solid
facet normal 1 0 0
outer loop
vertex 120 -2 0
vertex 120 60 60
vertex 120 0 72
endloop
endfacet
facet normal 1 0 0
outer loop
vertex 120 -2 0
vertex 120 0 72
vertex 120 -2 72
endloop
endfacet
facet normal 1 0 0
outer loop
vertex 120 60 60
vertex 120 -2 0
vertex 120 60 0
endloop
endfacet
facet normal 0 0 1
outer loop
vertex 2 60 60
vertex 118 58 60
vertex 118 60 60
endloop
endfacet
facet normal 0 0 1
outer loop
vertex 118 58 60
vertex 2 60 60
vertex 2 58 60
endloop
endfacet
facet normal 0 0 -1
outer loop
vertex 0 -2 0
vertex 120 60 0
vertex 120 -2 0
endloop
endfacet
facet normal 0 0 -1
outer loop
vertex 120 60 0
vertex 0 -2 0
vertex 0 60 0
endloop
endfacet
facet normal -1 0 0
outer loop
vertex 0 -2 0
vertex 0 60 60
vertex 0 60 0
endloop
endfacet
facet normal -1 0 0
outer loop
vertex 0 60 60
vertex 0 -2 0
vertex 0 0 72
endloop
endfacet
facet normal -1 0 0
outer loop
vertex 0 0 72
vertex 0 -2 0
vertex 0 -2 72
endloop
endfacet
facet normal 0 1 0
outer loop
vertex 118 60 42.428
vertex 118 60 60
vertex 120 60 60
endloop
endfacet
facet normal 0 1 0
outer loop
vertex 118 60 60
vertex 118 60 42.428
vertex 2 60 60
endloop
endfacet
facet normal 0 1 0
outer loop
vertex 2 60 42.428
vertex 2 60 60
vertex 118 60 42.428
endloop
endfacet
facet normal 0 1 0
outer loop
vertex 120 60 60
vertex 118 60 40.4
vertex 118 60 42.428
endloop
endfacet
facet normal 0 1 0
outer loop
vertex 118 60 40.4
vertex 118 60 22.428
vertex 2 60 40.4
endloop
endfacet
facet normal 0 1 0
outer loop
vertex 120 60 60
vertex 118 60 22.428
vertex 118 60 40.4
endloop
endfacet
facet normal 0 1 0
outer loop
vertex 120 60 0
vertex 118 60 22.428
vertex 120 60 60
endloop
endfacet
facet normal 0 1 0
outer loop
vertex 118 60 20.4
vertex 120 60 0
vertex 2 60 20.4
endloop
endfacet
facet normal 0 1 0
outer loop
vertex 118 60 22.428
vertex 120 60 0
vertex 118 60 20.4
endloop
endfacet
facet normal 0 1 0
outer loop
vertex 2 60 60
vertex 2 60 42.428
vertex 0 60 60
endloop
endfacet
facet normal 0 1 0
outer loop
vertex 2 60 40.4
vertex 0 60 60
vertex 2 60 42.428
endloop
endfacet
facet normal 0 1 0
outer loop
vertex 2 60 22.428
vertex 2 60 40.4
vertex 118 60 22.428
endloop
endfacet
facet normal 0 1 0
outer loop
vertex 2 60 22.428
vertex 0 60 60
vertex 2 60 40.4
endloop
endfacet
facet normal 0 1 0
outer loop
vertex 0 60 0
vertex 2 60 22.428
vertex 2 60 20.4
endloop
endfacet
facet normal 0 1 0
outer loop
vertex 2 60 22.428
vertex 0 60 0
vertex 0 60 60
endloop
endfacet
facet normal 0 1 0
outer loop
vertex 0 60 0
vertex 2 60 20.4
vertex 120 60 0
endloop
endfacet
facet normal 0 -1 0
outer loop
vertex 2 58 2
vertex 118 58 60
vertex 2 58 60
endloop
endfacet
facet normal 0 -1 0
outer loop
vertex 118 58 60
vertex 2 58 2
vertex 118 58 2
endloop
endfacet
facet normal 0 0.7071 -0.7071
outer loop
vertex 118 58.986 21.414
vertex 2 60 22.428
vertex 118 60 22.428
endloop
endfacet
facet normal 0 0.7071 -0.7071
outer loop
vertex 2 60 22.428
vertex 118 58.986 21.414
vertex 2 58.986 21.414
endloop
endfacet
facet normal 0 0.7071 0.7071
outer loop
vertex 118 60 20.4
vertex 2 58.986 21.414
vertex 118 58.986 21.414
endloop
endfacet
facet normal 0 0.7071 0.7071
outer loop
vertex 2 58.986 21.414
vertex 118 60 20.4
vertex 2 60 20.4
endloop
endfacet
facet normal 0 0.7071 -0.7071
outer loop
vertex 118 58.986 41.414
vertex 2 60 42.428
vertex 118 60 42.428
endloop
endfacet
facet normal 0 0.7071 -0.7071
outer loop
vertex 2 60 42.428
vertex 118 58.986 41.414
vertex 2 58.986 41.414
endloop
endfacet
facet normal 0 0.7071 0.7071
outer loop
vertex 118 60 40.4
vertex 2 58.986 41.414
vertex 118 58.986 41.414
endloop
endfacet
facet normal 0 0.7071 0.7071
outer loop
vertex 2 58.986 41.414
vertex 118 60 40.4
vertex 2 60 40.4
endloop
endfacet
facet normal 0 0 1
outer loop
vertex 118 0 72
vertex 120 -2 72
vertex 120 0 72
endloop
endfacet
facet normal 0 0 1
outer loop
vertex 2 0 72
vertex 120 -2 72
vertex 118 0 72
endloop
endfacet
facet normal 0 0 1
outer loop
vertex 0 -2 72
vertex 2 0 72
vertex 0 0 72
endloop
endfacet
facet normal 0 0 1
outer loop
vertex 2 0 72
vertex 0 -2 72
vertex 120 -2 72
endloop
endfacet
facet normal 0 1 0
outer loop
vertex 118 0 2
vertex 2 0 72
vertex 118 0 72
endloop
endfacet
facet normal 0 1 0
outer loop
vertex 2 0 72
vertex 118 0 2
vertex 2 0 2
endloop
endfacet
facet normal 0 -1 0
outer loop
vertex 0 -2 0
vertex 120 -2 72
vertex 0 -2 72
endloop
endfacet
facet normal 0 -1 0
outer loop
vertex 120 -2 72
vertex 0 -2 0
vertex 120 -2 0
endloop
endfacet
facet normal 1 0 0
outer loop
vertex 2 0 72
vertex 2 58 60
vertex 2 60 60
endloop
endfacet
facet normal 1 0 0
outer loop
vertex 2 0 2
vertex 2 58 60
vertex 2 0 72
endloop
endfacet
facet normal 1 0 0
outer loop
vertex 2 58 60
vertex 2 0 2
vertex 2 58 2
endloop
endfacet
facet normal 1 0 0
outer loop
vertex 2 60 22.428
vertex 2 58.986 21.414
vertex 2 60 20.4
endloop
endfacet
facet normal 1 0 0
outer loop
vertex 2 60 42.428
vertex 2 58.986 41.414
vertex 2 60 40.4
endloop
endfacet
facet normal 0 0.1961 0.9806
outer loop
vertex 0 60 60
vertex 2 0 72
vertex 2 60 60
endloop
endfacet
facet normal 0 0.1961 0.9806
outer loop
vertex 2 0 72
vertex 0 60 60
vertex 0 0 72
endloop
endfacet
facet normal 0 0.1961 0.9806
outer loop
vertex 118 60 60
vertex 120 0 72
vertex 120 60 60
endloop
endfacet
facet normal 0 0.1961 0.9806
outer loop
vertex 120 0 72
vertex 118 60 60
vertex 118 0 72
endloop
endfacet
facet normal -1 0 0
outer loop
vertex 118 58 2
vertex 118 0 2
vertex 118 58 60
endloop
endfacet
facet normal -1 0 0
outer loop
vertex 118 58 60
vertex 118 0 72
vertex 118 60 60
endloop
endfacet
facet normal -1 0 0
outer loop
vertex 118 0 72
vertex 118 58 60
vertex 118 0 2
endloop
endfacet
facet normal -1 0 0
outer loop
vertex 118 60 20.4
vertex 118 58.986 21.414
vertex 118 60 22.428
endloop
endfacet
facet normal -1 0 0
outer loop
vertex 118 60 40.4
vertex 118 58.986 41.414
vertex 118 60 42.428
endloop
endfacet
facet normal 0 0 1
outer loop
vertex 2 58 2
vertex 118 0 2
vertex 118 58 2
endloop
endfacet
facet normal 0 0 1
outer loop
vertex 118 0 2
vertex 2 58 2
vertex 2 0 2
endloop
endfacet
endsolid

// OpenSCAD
// file: ../util.scad
// numbers and logic
function int(s, total=0, i=0) = (i == len(s))
  ? total
  : int(s, total*10 + ord(s[i]) - ord("0"), i+1);

function frac(s) = int(s) / pow(10, len(s));

function num(s) =
  let (parts = split(s, "."))
  len(parts) == 1
  ? int(parts[0])
  : int(parts[0]) + frac(parts[1]);

function contains(list, item, i=0) = (i == len(list))
  ? false
  : list[i] == item || contains(list, item, i+1);

function any(list, i=0) = (i == len(list))
  ? false
  : list[i] || any(list, i+1);

function all(list, i=0) = (i == len(list))
  ? true
  : list[i] && all(list, i+1);

function _test_logic() =
  assert (int("123") == 123)
  assert (int("9999") == 9999)
  assert (frac("5") == 0.5)
  assert (frac("33333") == 0.33333)
  assert (frac("111111") == 0.111111)
  assert (frac("02") == 0.02)
  assert (frac("020000") == 0.02)
  assert (frac("0") == 0)
  assert (frac("0000000000000") == 0)
  assert (frac("0000000000001") == 0.0000000000001)
  assert (num("123") == 123)
  assert (num("2.75") == 2.75)
  assert (num("1234.991230149") == 1234.991230149) // I'm kinda shocked that works
  assert (contains("abcd", "d") == true)
  assert (contains("abcd", "Q") == false)
  assert (contains([1, 2, 3, 4], 1) == true)
  assert (contains([1, 2, 3, 4], 5) == false)
  assert (contains([["a"], 2, [], ""], []) == true)
  assert (contains([["a"], 2, [], ""], ["a"]) == true)
  assert (contains([["a"], 2, [], ""], ["b"]) == false)
  assert (all([1, true, "a"]) == true)
  assert (all([1, true, "a", ""]) == false)
  assert (all([]) == true)
  assert (any([false, "", 0, []]) == false)
  assert (any([false, "", 0, [], 1]) == true)
  assert (any([]) == false)
  "test logic success";

echo(_test_logic());


// strings
function is_int_string(s) = all([for(c=s) "0" <= c && c <= "9"]);

function is_num_string(s) =
  let (parts = split(s, "."))
  len(parts) == 1
  ? is_int_string(parts[0])
  : len(parts) == 2
    ? is_int_string(parts[0]) && is_int_string(parts[1])
    : false;

function strcat(char_array, i=0, r="") = (i == len(char_array))
  ? r
  : strcat(char_array, i+1, str(r, char_array[i]));

function substr(s, start=0, limit=undef) =
  // return str[i] where start <= i < limit
  let (end = limit == undef ? len(s)-1 : min(limit-1, len(s)-1))
  end < start
  ? ""
  : strcat([for (i=[start:end]) s[i]]);

function replace_substr(s, repl, start=0, limit=undef) =
  // remove a substring and replace it with another string
  let (end = limit == undef ? len(s)-1 : limit-1)
  str(substr(s, limit=start), repl, substr(s, start=end+1));

function split(s, separator=" ", parts=[]) =
  let (match=search(separator, s, 0)[0])
  match == []
  ? concat(parts, [s])
  : split(substr(s, start=match[0]+1), separator, concat(parts, [substr(s, limit=match[0])]));

function first(string, char, after=-1) =
  let (result = search(char, substr(string, start=after+1), 1))
  result == []
  ? undef
  : result[0] + after+1;

function last(string, char) =
  let (result=search(char, string, 0))
  result == []
  ? undef
  : result[0][len(result[0])-1];

function _test_strings() =
  assert (strcat([]) == "")
  assert (strcat(["a"]) == "a")
  assert (strcat(["a", "b"]) == "ab")
  assert (strcat(["a", "", "b"]) == "ab")
  assert (substr("abcde") == "abcde")
  assert (substr("abcde", start=0) == "abcde")
  assert (substr("abcde", start=1) == "bcde")
  assert (substr("abcde", limit=3) == "abc")
  assert (substr("abcde", start=2, limit=4) == "cd")
  assert (substr("abcde", start=99) == "")
  assert (replace_substr("abcde", "CD", start=2, limit=4) == "abCDe")
  assert (replace_substr("abcde", "CD", start=2, limit=5) == "abCD")
  assert (replace_substr("abcde", "CD", start=2, limit=999) == "abCD")
  assert (replace_substr("abcde", "CD", start=2) == "abCD")
  assert (replace_substr("abcde", "AAA", start=0) == "AAA")
  assert (replace_substr("abcde", "AAA") == "AAA")
  assert (replace_substr("abcde", "III", limit=0) == "IIIabcde")
  assert (replace_substr("abcde", "III", start=3, limit=3) == "abcIIIde")
  assert (replace_substr("abcde", "III", start=5) == "abcdeIII")
  assert (replace_substr("abcde", "III", start=999) == "abcdeIII")
  assert (split("abc,defg,hi", ",") == ["abc", "defg", "hi"])
  assert (split("abc,defg,hi", "#") == ["abc,defg,hi"])
  assert (split(",,ab,c,,d,efg", ",") == ["", "", "ab", "c", "", "d", "efg"])
  assert (split("a b  cd ") == ["a", "b", "", "cd", ""])
  assert (split("abcd") == ["abcd"])
  assert (is_int_string("1234") == true)
  assert (is_int_string("093999914") == true)
  assert (is_int_string("123A") == false)
  assert (is_int_string("two") == false)
  assert (is_num_string("2.6") == true)
  assert (is_num_string("1241422.5522106") == true)
  assert (is_num_string("124142205522106") == true)
  assert (is_num_string("1241422,5522106") == false)
  assert (is_num_string("1241422Q") == false)
  assert (first("aaaaa", "a") == 0)
  assert (first("00aaa", "a") == 2)
  assert (first("0000a", "a") == 4)
  assert (first("0000a", "Z") == undef)
  assert (first("aaaaa", "a", after=2) == 3)
  assert (first("aaa00", "a", after=2) == undef)
  assert (first("a000a", "a", after=0) == 4)
  assert (first("a000a", "a", after=99) == undef)
  assert (last("aaaaa", "a") == 4)
  assert (last("aaa00", "a") == 2)
  assert (last("a0000", "a") == 0)
  assert (last("a0000", "Z") == undef)
  "test strings success";

echo(_test_strings());


// global prop function
props_example = [
  ["key1", 1],
  ["key2", 2],
  ["key3", 3],
  ["key4", "$key3 * 20"],
  ["namespace.value1", 8],
  ["namespace.value2", "$key2"],
  ["othernamespace.value1", "$namespace.value2"],
  ["s", "hello"],
  ["e1", "$key3 / 2"],
  ["e2", "$namespace.value2 + 1.275"],
  ["e3", "$othernamespace.value1 * 6"],
  ["e4", "$key2 ^ 6"],
  ["e5", "$key3 % 2"],
  ["e6", "cos $key4"],
  ["p1", "$key3 * ($key2 + $key1)"],
  ["p2", "(1 + 2) * (2 ^ 3)"],
  ["p3", "((1 + $e5) + 1) + (cos $key4)"],
];

function eval_literal(args) =
  // compute things like `2 + 4` or `cos 45`
  len(args) == 0 ? undef :
  args[0] == "norm" ? norm([for(i=[1:len(args)-1]) args[i]]) :
  len(args) == 3
  ? args[1] == "/" ? args[0] / args[2]
    : args[1] == "*" ? args[0] * args[2]
    : args[1] == "+" ? args[0] + args[2]
    : args[1] == "-" ? args[0] - args[2]
    : args[1] == "^" ? args[0] ^ args[2]
    : args[1] == "%" ? args[0] % args[2]
    : undef
  : len(args) == 2
    ? args[0] == "sin" ? sin(args[1])
      : args[0] == "cos" ? cos(args[1])
      : args[0] == "tan" ? tan(args[1])
      : args[0] == "asin" ? asin(args[1])
      : args[0] == "acos" ? acos(args[1])
      : args[0] == "atan" ? atan(args[1])
      : args[0] == "sqrt" ? sqrt(args[1])
      : undef
    : len(args) == 1
      ? args[0]
      : undef;

function eval_raw(expression, props) =
  // resolve types and props in expressions, like "(cos $thing) * ($other / 3)"
  // note that whitespace is not ignored
  !is_string(expression)
  ? expression
  : !contains(expression, "(")
    ? // simple expression like "$thing + 5"
      eval_literal([
        for (arg=split(expression))
          arg[0] == "$"
          ? getprop(substr(arg, start=1), props)
          : is_num_string(arg)
            ? num(arg)
            : arg
      ])
    : // resolve the innermost parens and start again
      let (inner_start = last(expression, "("),
           inner_end = first(expression, ")", after=inner_start),
           inner = eval_raw(substr(expression, inner_start+1, inner_end), props))
      eval_raw(replace_substr(expression, inner, inner_start, inner_end+1), props);

function getprop(key, props) =
  let (prop = props[search([key], props)[0]][1])
  assert (prop, str("Missing key in properties: ", key))
  eval_raw(prop, props);

function _test_props() =
  assert (getprop("key3", props_example) == 3)
  assert (getprop("namespace.value2", props_example) == 2)
  assert (getprop("e1", props_example) == 1.5)
  assert (getprop("e2", props_example) == 3.275)
  assert (getprop("e3", props_example) == 12)
  assert (getprop("e4", props_example) == 64)
  assert (getprop("e5", props_example) == 1)
  assert (getprop("e6", props_example) == 0.5)
  assert (getprop("p1", props_example) == 9)
  assert (getprop("p2", props_example) == 24)
  assert (getprop("p3", props_example) == 3.5)
  assert (getprop("s", props_example) == "hello")
  "test props success";

echo(_test_props());

// bezier
function bezier(points, count=30) =
  // Generate points along the bezier curve for a given list of control points
  len(points) == 1
  ? [for (i=[0:count-1]) points[0]]
  : let (head=bezier([for (i=[0:len(points)-2]) points[i]], count),
         tail=bezier([for (i=[1:len(points)-1]) points[i]], count))
    [for (i=[0:count-1]) head[i] + (tail[i] - head[i]) * i / (count-1)];

/*// Demo

p0 = [0, 0];
p1 = [6, 1];
p2 = [5, 5];
p3 = [2, 4];

for (i = bezier([p0, p1], count=10)) translate(i) circle(r=.1, $fn=32);
for (i = bezier([p1, p2], count=10)) translate(i) circle(r=.1, $fn=32);
for (i = bezier([p2, p3], count=10)) translate(i) circle(r=.1, $fn=32);
for (i = bezier([p0, p1, p2, p3])) color("green") translate(i) circle(r=.1, $fn=32);
//*/
// file: props.scad
use <../util.scad>

global_props = [
  // basic exterior dimensions
  ["box.depth", 60],
  ["box.width", 120],
  ["box.front.height", 60],
  ["box.back.height", 72],
  ["panel.thickness", 2],

  // lid/hinge
  ["lid.angle", "atan ($box.depth / ($box.back.height - $box.front.height))"],
  ["lid.length", "norm $box.depth ($box.back.height - $box.front.height)"],
  ["hinge.radius", 4.33333],
  ["hinge.length", 120],
  // hinge fin position
  ["hinge.fin.start", 5],
  ["hinge.fin.end", "$hinge.length - $hinge.fin.start"],
  ["hinge.fin.count", 5],
  // hinge fin shape
  ["hinge.fin.length", "$lid.length - $panel.thickness"],
  ["hinge.fin.width", 2.31],
  ["hinge.fin.height", "$hinge.radius * 2"],
  ["hinge.fin.taper.angle", 40],
  ["hinge.fin.margin", 0.3],
  // hinge pin
  ["hinge.pin.radius", 2.88888],
  ["hinge.pin.margin", 0.2],
  ["hinge.pin.start", 2],
  ["hinge.pin.end", "$hinge.length - $hinge.pin.start"],
];

function prop(key) = getprop(key, global_props);
// main file
use <props.scad>
module _front(
  width=prop("box.width"),
  height=prop("box.front.height"),
  thickness=prop("panel.thickness")
) {
  translate([0, prop("box.depth")-thickness, 0])
  difference() {
    cube([width, thickness, height]);
    // "v" cutouts, 1.2 thickness here leaves about half the thickness left
    translate([-1, 1.2*thickness, height/3])
      rotate([45, 0, 0])
        cube([width+2, thickness, thickness]);
    translate([-1, 1.2*thickness, 2*height/3])
      rotate([45, 0, 0])
        cube([width+2, thickness, thickness]);
  }
}

module _back(
  width=prop("box.width"),
  height=prop("box.back.height"),
  thickness=prop("panel.thickness"),
) {
  translate([0, -thickness, 0])
    cube([width, thickness, height]);
}

module _side(
  depth=prop("box.depth"),
  front_height=prop("box.front.height"),
  back_height=prop("box.back.height"),
  thickness=prop("panel.thickness"),
) {
  translate([thickness, 0, 0])
    rotate([0, -90, 0])
      linear_extrude(height=thickness)
        polygon([[0, 0], [0, depth], [front_height, depth], [back_height, 0]]);
}

module _bottom(
  width=prop("box.width"),
  depth=prop("box.depth"),
  thickness=prop("panel.thickness"),
) {
  cube([width, depth, thickness]);
}

module box() {
  _back();
  _front();
  _side();
  translate([prop("box.width")-prop("panel.thickness"), 0, 0])
    _side();
  _bottom();
}

box();
